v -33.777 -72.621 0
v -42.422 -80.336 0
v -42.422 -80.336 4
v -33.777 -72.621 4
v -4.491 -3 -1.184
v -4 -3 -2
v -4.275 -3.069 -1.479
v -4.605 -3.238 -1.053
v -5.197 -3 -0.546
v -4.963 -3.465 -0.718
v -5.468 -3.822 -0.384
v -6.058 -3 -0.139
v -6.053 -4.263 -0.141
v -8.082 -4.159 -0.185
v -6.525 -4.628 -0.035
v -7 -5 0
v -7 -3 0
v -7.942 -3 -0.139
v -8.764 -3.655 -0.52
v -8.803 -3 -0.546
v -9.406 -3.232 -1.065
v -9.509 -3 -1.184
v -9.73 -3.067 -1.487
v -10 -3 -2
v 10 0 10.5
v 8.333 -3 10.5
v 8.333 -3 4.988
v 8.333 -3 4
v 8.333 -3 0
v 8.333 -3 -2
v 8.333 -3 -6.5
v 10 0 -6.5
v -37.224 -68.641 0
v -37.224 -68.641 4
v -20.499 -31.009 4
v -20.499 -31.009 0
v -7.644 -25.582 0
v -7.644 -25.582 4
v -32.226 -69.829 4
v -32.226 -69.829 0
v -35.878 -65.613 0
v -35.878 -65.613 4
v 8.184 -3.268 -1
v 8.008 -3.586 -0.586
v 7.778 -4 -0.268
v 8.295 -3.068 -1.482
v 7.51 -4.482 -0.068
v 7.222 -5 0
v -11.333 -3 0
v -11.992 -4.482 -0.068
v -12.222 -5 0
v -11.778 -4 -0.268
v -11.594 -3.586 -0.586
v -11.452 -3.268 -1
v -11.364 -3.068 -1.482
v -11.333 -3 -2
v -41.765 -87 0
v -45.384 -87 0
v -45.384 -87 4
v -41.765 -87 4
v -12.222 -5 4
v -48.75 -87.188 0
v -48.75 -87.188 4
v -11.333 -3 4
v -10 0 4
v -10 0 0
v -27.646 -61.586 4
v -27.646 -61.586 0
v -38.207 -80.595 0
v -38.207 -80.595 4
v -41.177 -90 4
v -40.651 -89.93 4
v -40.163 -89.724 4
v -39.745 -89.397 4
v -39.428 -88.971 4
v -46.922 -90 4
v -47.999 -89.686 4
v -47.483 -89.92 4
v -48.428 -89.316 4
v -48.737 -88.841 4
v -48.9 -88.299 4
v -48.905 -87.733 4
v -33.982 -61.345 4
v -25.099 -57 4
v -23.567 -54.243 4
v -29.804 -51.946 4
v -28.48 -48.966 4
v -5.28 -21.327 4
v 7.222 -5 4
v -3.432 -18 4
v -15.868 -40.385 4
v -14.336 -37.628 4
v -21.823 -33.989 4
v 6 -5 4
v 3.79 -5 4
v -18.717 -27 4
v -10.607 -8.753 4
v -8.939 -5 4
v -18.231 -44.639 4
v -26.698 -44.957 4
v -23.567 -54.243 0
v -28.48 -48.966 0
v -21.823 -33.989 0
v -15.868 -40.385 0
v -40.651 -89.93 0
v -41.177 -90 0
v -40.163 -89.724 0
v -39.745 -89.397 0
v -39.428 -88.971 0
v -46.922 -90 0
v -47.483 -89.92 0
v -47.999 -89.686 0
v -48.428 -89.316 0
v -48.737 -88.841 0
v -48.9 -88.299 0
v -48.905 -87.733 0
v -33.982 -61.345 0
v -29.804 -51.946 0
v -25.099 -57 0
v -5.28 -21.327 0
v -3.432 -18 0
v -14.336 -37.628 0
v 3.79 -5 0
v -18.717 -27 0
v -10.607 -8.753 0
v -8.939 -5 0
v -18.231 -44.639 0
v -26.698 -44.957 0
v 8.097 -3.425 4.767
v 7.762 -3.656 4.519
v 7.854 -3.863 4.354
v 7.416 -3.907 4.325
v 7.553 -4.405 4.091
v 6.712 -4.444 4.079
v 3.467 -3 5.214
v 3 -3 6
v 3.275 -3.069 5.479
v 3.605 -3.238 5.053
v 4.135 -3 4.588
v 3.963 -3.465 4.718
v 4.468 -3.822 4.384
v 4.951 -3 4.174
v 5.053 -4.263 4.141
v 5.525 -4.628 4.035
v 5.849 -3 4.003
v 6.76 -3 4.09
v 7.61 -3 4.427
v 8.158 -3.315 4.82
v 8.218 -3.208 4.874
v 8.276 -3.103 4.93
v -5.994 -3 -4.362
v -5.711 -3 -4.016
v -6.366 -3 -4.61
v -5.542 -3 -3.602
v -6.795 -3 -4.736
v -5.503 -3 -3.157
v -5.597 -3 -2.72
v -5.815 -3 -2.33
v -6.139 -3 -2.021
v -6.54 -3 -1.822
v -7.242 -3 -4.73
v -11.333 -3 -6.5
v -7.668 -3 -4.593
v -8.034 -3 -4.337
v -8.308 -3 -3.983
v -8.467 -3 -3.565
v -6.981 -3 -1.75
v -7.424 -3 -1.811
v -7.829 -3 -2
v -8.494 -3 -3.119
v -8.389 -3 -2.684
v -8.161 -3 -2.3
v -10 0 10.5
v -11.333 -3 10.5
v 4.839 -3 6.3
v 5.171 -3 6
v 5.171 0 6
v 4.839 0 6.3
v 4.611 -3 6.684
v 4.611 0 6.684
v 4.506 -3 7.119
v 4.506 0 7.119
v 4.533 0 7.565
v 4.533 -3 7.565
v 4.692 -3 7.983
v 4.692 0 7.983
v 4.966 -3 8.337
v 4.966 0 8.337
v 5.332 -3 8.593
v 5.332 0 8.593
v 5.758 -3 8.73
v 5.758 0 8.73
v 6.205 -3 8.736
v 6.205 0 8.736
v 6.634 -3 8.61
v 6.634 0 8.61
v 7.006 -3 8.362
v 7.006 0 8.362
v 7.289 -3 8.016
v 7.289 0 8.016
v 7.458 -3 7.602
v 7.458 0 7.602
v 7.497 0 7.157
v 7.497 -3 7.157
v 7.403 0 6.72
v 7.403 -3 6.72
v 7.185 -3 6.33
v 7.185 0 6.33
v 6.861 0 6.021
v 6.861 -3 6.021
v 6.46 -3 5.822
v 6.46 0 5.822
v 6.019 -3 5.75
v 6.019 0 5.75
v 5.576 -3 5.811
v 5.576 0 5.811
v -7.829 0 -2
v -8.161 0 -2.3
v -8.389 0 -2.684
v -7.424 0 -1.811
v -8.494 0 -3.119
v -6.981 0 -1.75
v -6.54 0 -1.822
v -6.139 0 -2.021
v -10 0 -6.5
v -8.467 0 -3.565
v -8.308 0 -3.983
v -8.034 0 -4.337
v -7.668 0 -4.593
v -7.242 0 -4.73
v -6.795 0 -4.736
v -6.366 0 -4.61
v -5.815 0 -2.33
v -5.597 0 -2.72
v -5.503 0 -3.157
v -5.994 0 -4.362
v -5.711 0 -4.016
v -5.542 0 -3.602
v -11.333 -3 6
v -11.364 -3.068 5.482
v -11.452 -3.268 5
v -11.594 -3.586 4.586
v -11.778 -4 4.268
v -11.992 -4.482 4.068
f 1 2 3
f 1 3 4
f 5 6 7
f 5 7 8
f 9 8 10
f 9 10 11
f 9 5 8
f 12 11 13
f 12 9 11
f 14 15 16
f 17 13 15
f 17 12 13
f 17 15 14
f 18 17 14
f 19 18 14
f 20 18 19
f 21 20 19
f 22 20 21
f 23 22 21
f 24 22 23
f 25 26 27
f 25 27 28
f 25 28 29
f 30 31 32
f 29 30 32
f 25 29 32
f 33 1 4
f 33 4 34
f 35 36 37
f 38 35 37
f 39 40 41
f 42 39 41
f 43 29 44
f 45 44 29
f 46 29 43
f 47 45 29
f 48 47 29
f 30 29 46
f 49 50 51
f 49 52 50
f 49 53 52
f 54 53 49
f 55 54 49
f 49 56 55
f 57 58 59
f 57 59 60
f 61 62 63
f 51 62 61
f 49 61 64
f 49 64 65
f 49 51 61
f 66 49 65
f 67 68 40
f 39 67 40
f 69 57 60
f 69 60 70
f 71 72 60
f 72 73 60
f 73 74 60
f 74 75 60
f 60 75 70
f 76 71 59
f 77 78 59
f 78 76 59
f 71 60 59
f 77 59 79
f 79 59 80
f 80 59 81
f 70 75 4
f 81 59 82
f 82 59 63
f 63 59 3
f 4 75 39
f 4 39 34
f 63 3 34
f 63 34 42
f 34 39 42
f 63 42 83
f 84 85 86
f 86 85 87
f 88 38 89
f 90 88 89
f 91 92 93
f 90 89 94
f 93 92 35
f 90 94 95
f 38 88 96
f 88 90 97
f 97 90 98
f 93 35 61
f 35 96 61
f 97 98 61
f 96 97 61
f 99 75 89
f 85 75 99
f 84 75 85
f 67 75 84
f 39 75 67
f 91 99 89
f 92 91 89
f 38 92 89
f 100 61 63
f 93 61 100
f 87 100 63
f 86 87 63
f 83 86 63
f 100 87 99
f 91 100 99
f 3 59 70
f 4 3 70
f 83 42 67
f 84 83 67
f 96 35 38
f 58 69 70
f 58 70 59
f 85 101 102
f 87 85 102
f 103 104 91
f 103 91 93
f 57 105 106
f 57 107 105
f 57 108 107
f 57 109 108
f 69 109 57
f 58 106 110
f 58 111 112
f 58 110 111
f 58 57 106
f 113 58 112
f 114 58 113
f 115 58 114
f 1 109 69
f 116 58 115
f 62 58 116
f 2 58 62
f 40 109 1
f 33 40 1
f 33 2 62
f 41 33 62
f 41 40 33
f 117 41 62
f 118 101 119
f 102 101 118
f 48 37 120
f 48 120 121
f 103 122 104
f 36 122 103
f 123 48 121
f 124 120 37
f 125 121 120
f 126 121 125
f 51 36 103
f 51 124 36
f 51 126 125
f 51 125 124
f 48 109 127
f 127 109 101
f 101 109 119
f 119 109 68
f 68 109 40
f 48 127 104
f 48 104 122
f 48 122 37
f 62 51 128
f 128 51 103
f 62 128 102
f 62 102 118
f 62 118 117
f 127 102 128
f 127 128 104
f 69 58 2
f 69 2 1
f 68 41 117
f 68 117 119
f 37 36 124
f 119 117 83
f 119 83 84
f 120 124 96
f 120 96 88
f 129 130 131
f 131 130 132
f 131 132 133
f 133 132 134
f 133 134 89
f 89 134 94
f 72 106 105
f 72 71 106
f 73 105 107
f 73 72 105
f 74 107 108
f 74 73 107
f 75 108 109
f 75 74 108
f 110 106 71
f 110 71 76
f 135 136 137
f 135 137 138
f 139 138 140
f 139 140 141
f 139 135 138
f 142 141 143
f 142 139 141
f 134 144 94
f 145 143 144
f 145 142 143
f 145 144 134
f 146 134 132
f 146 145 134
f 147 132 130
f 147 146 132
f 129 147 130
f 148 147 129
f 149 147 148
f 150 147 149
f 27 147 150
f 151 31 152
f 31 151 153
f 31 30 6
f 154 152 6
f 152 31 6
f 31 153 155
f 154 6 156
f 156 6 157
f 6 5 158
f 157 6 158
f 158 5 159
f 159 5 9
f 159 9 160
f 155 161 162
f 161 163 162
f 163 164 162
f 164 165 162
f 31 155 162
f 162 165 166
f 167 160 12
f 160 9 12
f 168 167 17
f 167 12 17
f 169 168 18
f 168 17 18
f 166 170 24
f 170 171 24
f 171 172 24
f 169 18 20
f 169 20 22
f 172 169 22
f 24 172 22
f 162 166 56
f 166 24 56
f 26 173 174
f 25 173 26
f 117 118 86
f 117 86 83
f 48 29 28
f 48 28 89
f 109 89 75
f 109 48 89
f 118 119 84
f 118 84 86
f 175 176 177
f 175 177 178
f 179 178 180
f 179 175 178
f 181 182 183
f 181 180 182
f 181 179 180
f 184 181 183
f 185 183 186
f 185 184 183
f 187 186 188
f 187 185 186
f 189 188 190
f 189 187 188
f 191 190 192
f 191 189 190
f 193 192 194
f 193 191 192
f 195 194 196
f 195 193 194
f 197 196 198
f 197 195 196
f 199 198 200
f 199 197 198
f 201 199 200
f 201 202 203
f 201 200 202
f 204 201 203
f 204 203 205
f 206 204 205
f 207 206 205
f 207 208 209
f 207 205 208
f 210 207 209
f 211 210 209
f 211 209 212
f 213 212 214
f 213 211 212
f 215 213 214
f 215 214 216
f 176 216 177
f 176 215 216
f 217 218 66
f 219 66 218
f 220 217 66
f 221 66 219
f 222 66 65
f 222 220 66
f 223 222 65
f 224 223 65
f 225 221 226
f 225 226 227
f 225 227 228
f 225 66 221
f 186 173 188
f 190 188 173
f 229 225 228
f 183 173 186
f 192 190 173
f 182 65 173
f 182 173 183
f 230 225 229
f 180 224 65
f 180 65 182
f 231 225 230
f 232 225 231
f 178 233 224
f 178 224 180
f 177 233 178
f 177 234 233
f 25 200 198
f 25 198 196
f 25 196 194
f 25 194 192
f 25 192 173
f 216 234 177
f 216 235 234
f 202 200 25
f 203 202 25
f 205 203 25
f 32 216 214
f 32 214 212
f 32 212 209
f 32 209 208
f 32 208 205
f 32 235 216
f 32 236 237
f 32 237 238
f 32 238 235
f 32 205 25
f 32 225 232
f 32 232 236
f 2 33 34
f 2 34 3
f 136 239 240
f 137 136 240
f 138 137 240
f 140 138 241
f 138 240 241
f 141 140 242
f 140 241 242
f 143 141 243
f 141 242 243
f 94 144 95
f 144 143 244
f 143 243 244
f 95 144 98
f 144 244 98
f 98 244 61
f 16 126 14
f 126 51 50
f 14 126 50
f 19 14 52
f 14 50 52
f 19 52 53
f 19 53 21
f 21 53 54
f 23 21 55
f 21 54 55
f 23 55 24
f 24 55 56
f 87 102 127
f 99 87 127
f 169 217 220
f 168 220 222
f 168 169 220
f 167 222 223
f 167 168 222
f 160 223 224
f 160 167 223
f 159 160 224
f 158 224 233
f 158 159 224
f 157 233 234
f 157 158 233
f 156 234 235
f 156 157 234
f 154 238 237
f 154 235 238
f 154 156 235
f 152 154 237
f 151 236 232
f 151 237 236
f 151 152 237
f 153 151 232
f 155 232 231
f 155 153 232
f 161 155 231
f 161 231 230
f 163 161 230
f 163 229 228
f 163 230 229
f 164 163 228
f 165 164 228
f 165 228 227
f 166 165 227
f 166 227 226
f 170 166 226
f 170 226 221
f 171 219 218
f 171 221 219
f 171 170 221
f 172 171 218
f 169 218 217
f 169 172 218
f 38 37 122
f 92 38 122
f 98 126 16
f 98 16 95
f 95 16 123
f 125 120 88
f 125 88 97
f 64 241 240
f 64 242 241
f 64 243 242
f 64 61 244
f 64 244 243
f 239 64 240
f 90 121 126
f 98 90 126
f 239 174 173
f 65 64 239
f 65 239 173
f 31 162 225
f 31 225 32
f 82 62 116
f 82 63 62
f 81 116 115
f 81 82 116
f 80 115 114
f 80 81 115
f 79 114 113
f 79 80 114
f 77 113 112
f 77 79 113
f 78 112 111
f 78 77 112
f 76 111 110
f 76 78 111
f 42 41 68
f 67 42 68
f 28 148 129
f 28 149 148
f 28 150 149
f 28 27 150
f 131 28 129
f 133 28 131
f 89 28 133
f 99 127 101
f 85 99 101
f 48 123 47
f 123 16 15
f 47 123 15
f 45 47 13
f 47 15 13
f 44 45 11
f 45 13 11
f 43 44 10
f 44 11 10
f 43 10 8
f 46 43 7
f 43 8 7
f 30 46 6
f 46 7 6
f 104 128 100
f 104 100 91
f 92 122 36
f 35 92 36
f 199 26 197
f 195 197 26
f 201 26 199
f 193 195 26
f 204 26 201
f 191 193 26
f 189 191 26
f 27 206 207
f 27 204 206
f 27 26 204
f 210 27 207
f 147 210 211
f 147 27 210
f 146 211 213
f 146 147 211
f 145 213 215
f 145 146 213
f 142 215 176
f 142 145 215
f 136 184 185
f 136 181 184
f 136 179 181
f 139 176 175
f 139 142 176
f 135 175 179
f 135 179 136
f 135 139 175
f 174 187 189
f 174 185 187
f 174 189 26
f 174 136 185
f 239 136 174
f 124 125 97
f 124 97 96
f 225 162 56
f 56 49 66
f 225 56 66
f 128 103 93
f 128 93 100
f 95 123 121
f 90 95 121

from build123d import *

# Parameters (mm, degrees)
BOSS_EXTRUDE1_DEPTH             = 4
SKETCH2_W                       = 20
SKETCH2_H                       = 17
BOSS_EXTRUDE2_DEPTH             = 3
CUT_EXTRUDE1_DEPTH              = 104.490337713
CUT_EXTRUDE1_DEPTH_BACK         = 104.490337713
BOSS_EXTRUDE3_REACH             = 105.49
BOSS_EXTRUDE3_DIRECTION_2_REACH = 105.49
FILLET2_START                   = -12.222222222
FILLET2_DEPTH                   = 20.555555555
FILLET2_START_2                 = -6.5
FILLET2_2_DEPTH                 = 17
CUT_EXTRUDE2_DEPTH              = 104.490337713
CUT_EXTRUDE2_DEPTH_BACK         = 104.490337713
SKETCH4_R                       = 1.5
FILLET1_R                       = 2
SKETCH8_R                       = 3.25
CUT_EXTRUDE5_DEPTH              = 2


with BuildPart() as part:
    # Sketch1 → Boss-Extrude1 (new body)
    with BuildSketch(Plane.XY):
        Polygon((-10, 0), (10, 0), (-40, -90), (-50, -90), align=None)
        Polygon((-8.939269622, -5), (3.790345509, -5), (-3.431876714, -18), align=None, mode=Mode.SUBTRACT)
        Polygon((-10.607355622, -8.753193502), (-18.717047399, -27), (-5.280384607, -21.327314208), align=None, mode=Mode.SUBTRACT)
        Polygon((-7.643825511, -25.581507835), (-14.336143532, -37.627680274), (-20.498621264, -31.008541196), align=None, mode=Mode.SUBTRACT)
        Polygon((-21.823082205, -33.988578312), (-26.698028096, -44.957206566), (-15.867976064, -40.384978831), align=None, mode=Mode.SUBTRACT)
        Polygon((-18.231416968, -44.639172459), (-23.566710848, -54.242701442), (-28.47960196, -48.965747762), align=None, mode=Mode.SUBTRACT)
        Polygon((-29.804062901, -51.945784878), (-33.981685193, -61.345435036), (-25.09854338, -57), align=None, mode=Mode.SUBTRACT)
        Polygon((-45.383714066, -87), (-41.765210047, -87), (-38.207091023, -80.595385758), align=None, mode=Mode.SUBTRACT)
        Polygon((-27.646340017, -61.586033947), (-32.225825485, -69.829107788), (-35.878360761, -65.612955064), align=None, mode=Mode.SUBTRACT)
        Polygon((-37.22421022, -68.641116347), (-42.421865314, -80.335840308), (-33.776674606, -72.620636206), align=None, mode=Mode.SUBTRACT)
    extrude(amount=BOSS_EXTRUDE1_DEPTH)

    # Sketch2 → Boss-Extrude2 (add)
    with BuildSketch(Plane(origin=(0, 0, 0), x_dir=(1, 0, 0), z_dir=(0, 1, 0))):
        with Locations((0, -2)):
            Rectangle(SKETCH2_W, SKETCH2_H)
    extrude(amount=-BOSS_EXTRUDE2_DEPTH)

    # Sketch3 → Cut-Extrude1 (cut, two sides: drawn at the far end of the back side and taken through both)
    with BuildSketch(Plane.XY.offset(4).offset(-CUT_EXTRUDE1_DEPTH_BACK)):
        Polygon((8.333333333, -3), (10, 0), (10, -3), align=None)
    extrude(amount=CUT_EXTRUDE1_DEPTH + CUT_EXTRUDE1_DEPTH_BACK, mode=Mode.SUBTRACT)

    # Boss-Extrude3: up to this face of the body (flat: up to its plane)
    boss_extrude3_end = Plane(part.part.faces().sort_by_distance((-0.410628019, -1.47826087, 10.5))[0])
    # Sketch7 → Boss-Extrude3 (add, up to the picked face)
    with BuildSketch(Plane.XY.offset(4), mode=Mode.PRIVATE) as boss_extrude3_sk1:
        Polygon((-10, -3), (-11.333333333, -3), (-10, 0), align=None)
    boss_extrude3_tool1 = split(extrude(boss_extrude3_sk1.sketch, amount=BOSS_EXTRUDE3_REACH, mode=Mode.PRIVATE), bisect_by=boss_extrude3_end, keep=Keep.BOTH, mode=Mode.PRIVATE)
    add(boss_extrude3_tool1.solids().sort_by(Axis((-10.444444, -2, 4), (0, 0, 1)))[0])

    # Boss-Extrude3 direction 2: up to this face of the body (flat: up to its plane)
    boss_extrude3_direction_2_end = Plane(part.part.faces().sort_by_distance((-0.410628019, -1.47826087, -6.5))[0])
    # Sketch7 → Boss-Extrude3 direction 2 (add, up to the picked face)
    with BuildSketch(Plane.XY.offset(4), mode=Mode.PRIVATE) as boss_extrude3_direction_2_sk1:
        Polygon((-10, -3), (-11.333333333, -3), (-10, 0), align=None)
    boss_extrude3_direction_2_tool1 = split(extrude(boss_extrude3_direction_2_sk1.sketch, amount=-BOSS_EXTRUDE3_DIRECTION_2_REACH, mode=Mode.PRIVATE), bisect_by=boss_extrude3_direction_2_end, keep=Keep.BOTH, mode=Mode.PRIVATE)
    add(boss_extrude3_direction_2_tool1.solids().sort_by(Axis((-10.444444, -2, 4), (0, 0, -1)))[0])

    # Fillet2: read off the stored shape, not the designer's step
    # Fillet2 outline → Fillet2 (add)
    with BuildSketch(Plane.YZ.offset(FILLET2_START)):
        with BuildLine():
            Line((-3, 4), (-3, 6))
            ThreePointArc((-3, 6), (-3.585786438, 4.585786438), (-5, 4))
            Line((-5, 4), (-3, 4))
        make_face()
        with BuildLine():
            ThreePointArc((-5, 0), (-3.585786438, -0.585786438), (-3, -2))
            Line((-3, -2), (-3, 0))
            Line((-3, 0), (-5, 0))
        make_face()
    extrude(amount=FILLET2_DEPTH)

    # Fillet2 2 outline → Fillet2 2 (cut)
    with BuildSketch(Plane.XY.offset(FILLET2_START_2)):
        Polygon((10, -1), (9.444444444, -1), (8.333333333, -3), (6.666666667, -6), (10, -6), align=None)
        Polygon((-12.222222222, -5), (-11.333333333, -3), (-12.222222222, -3), align=None)
    extrude(amount=FILLET2_2_DEPTH, mode=Mode.SUBTRACT)

    # Sketch4 → Cut-Extrude2 (cut, two sides: drawn at the far end of the back side and taken through both)
    with BuildSketch(Plane(origin=(0, 0, 0), x_dir=(1, 0, 0), z_dir=(0, 1, 0)).offset(-CUT_EXTRUDE2_DEPTH_BACK)):
        with Locations(Location((-7, 3.25, 0), (0, 0, 236.442690238))):
            Circle(SKETCH4_R)
        with Locations(Location((6, -7.25, 0), (0, 0, 123.557309765))):
            Circle(SKETCH4_R)
    extrude(amount=CUT_EXTRUDE2_DEPTH + CUT_EXTRUDE2_DEPTH_BACK, mode=Mode.SUBTRACT)

    # Fillet1
    fillet1_edges = [part.edges().sort_by_distance(p)[0] for p in [
        (-40, -90, 2),
        (-50, -90, 2),
    ]]
    fillet(fillet1_edges, radius=FILLET1_R)

    # Sketch8 → Cut-Extrude5 (cut)
    with BuildSketch(Plane.XZ.offset(3)):
        with Locations((-7, -3.25)):
            Circle(SKETCH8_R)
        with Locations((6, 7.25)):
            Circle(SKETCH8_R)
    extrude(amount=CUT_EXTRUDE5_DEPTH, mode=Mode.SUBTRACT)


solid = part.part
